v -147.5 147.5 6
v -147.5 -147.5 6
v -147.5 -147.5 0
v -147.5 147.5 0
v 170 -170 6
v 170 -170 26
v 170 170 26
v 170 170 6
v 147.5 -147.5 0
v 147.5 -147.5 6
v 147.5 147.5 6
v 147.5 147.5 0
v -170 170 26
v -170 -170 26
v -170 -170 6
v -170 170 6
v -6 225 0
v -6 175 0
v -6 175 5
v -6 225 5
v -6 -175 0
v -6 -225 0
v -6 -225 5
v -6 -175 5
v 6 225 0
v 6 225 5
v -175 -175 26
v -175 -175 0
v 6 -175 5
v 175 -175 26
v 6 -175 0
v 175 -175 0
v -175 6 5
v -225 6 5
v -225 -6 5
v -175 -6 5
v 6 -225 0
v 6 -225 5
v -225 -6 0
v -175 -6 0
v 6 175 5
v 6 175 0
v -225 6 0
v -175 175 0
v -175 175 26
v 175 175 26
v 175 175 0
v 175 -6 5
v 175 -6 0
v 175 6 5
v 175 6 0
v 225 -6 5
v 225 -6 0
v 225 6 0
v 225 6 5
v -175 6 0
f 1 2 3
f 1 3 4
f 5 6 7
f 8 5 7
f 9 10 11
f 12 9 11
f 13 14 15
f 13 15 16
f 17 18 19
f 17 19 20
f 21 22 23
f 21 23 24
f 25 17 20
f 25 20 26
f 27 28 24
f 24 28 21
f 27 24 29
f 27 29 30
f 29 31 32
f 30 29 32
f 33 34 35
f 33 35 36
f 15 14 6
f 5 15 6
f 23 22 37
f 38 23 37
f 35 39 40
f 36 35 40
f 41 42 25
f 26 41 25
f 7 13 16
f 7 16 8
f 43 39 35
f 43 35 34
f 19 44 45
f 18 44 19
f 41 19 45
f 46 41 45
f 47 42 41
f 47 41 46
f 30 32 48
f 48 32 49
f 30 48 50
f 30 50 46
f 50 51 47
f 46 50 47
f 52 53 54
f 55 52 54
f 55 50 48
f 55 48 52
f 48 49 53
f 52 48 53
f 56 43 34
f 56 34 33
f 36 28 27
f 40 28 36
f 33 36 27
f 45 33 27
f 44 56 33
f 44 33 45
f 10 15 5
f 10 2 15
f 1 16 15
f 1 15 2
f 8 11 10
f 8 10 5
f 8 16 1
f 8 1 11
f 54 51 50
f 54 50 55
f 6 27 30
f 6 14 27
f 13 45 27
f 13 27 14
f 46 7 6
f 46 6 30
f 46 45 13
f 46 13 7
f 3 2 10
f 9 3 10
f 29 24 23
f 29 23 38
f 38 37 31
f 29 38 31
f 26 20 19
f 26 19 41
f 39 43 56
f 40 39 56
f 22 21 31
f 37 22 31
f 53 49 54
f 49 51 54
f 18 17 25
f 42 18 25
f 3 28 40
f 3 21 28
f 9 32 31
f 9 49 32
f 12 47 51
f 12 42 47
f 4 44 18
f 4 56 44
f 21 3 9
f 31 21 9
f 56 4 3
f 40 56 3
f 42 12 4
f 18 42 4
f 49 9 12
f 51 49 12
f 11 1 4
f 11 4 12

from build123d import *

# Parameters (mm, degrees)
ESQUISSE1_W             = 350
ESQUISSE1_H             = 350
BOSS_EXTRU_1_DEPTH      = 26
ESQUISSE2_W             = 340
ESQUISSE2_H             = 340
ESQUISSE2_W_2           = 295
ESQUISSE2_H_2           = 295
ENL_V_MAT_EXTRU_1_DEPTH = 20
ESQUISSE3_W             = 295
ESQUISSE3_H             = 295
ENL_V_MAT_EXTRU_2_DEPTH = 249.849352018
ESQUISSE4_W             = 50
ESQUISSE4_H             = 12
ESQUISSE4_W_2           = 12
ESQUISSE4_H_2           = 50
BOSS_EXTRU_2_DEPTH      = 5


with BuildPart() as part:
    # Esquisse1 → Boss.-Extru.1 (new body)
    with BuildSketch(Plane.XY):
        Rectangle(ESQUISSE1_W, ESQUISSE1_H)
    extrude(amount=BOSS_EXTRU_1_DEPTH)

    # Esquisse2 → Enlèv. mat.-Extru.1 (cut)
    with BuildSketch(Plane.XY.offset(26)):
        Rectangle(ESQUISSE2_W, ESQUISSE2_H)
        Rectangle(ESQUISSE2_W_2, ESQUISSE2_H_2, mode=Mode.SUBTRACT)
    extrude(amount=-ENL_V_MAT_EXTRU_1_DEPTH, mode=Mode.SUBTRACT)

    # Esquisse3 → Enlèv. mat.-Extru.2 (cut, through all)
    with BuildSketch(Plane.XY.offset(26)):
        Rectangle(ESQUISSE3_W, ESQUISSE3_H)
    extrude(amount=-ENL_V_MAT_EXTRU_2_DEPTH, mode=Mode.SUBTRACT)

    # Esquisse4 → Boss.-Extru.2 (add)
    with BuildSketch(Plane.XY):
        with Locations((-200, 0)):
            Rectangle(ESQUISSE4_W, ESQUISSE4_H)
        with Locations((200, 0)):
            Rectangle(ESQUISSE4_W, ESQUISSE4_H)
        with Locations((0, 200)):
            Rectangle(ESQUISSE4_W_2, ESQUISSE4_H_2)
        with Locations((0, -200)):
            Rectangle(ESQUISSE4_W_2, ESQUISSE4_H_2)
    extrude(amount=BOSS_EXTRU_2_DEPTH)


solid = part.part
